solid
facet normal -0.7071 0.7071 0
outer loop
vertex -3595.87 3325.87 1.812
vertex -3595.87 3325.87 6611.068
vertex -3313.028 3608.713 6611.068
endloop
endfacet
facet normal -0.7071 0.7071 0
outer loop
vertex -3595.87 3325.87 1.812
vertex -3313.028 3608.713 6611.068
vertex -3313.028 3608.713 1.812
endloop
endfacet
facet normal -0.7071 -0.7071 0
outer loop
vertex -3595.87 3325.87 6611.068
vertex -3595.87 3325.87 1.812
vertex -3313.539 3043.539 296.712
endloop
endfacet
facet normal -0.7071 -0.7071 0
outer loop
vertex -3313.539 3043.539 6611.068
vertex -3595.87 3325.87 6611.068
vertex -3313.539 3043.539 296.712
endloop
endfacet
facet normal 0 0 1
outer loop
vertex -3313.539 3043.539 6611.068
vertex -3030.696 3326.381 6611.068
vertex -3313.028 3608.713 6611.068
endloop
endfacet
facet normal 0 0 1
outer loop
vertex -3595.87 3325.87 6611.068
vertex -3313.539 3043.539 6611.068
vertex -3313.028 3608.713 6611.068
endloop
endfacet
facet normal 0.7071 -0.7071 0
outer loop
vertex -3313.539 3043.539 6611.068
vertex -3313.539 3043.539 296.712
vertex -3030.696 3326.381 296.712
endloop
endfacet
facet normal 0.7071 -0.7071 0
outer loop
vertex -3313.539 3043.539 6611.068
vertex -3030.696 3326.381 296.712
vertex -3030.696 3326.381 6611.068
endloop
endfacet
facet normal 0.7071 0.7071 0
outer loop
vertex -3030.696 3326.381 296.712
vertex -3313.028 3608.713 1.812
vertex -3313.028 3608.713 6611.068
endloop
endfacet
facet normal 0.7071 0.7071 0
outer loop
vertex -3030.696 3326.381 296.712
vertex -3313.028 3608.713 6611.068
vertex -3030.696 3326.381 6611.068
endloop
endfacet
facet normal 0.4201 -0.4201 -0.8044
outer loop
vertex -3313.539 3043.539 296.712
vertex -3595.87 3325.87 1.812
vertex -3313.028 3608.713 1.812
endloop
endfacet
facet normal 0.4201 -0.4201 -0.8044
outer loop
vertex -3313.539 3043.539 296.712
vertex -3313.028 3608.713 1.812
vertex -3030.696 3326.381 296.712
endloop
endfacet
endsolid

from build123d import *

# Parameters (mm, degrees)
EXTRUDE_DEPTH                     = 400
EXTRUDE_ONTO_SKETCH121_ROLL_ANGLE = 90
EXTRUDE_PLACEMENT_ANGLE           = -45


with BuildPart() as landing_leg:
    # Sketch121 as drawn → Extrude (new)
    with BuildSketch(Plane.XY):
        Polygon((2890, 6611.067627), (3289.277588, 6611.067627), (3289.277588, 1.812012), (2890, 296.711548), align=None)
    extrude(amount=EXTRUDE_DEPTH)


with BuildPart() as landing_leg_1:
    # Extrude onto Sketch121 roll: moved
    add(landing_leg.part.rotate(Axis((0, 0, 0), (1, 0, 0)), EXTRUDE_ONTO_SKETCH121_ROLL_ANGLE))


with BuildPart() as landing_leg_2:
    # Extrude onto Sketch121 placement: moved
    add(landing_leg_1.part)


with BuildPart() as landing_leg_3:
    # Extrude placement: moved
    add(landing_leg_2.part.moved(Location((1270, -1000, 0))).rotate(Axis((1270, -1000, 0), (0, 0, 1)), EXTRUDE_PLACEMENT_ANGLE))


with BuildPart() as part_mirroring004:
    # Part__Mirroring004: instance of landing leg 
    add(landing_leg_3.part.mirror(Plane(origin=(0, 0, 0), x_dir=(0, -1, 0), z_dir=(1, 0, 0))))


with BuildPart() as part_mirroring006:
    # Part__Mirroring006: instance of Part__Mirroring004
    add(part_mirroring004.part.mirror(Plane(origin=(0, 0, 0), x_dir=(1, 0, 0), z_dir=(0, 1, 0))))


solid = part_mirroring006.part
